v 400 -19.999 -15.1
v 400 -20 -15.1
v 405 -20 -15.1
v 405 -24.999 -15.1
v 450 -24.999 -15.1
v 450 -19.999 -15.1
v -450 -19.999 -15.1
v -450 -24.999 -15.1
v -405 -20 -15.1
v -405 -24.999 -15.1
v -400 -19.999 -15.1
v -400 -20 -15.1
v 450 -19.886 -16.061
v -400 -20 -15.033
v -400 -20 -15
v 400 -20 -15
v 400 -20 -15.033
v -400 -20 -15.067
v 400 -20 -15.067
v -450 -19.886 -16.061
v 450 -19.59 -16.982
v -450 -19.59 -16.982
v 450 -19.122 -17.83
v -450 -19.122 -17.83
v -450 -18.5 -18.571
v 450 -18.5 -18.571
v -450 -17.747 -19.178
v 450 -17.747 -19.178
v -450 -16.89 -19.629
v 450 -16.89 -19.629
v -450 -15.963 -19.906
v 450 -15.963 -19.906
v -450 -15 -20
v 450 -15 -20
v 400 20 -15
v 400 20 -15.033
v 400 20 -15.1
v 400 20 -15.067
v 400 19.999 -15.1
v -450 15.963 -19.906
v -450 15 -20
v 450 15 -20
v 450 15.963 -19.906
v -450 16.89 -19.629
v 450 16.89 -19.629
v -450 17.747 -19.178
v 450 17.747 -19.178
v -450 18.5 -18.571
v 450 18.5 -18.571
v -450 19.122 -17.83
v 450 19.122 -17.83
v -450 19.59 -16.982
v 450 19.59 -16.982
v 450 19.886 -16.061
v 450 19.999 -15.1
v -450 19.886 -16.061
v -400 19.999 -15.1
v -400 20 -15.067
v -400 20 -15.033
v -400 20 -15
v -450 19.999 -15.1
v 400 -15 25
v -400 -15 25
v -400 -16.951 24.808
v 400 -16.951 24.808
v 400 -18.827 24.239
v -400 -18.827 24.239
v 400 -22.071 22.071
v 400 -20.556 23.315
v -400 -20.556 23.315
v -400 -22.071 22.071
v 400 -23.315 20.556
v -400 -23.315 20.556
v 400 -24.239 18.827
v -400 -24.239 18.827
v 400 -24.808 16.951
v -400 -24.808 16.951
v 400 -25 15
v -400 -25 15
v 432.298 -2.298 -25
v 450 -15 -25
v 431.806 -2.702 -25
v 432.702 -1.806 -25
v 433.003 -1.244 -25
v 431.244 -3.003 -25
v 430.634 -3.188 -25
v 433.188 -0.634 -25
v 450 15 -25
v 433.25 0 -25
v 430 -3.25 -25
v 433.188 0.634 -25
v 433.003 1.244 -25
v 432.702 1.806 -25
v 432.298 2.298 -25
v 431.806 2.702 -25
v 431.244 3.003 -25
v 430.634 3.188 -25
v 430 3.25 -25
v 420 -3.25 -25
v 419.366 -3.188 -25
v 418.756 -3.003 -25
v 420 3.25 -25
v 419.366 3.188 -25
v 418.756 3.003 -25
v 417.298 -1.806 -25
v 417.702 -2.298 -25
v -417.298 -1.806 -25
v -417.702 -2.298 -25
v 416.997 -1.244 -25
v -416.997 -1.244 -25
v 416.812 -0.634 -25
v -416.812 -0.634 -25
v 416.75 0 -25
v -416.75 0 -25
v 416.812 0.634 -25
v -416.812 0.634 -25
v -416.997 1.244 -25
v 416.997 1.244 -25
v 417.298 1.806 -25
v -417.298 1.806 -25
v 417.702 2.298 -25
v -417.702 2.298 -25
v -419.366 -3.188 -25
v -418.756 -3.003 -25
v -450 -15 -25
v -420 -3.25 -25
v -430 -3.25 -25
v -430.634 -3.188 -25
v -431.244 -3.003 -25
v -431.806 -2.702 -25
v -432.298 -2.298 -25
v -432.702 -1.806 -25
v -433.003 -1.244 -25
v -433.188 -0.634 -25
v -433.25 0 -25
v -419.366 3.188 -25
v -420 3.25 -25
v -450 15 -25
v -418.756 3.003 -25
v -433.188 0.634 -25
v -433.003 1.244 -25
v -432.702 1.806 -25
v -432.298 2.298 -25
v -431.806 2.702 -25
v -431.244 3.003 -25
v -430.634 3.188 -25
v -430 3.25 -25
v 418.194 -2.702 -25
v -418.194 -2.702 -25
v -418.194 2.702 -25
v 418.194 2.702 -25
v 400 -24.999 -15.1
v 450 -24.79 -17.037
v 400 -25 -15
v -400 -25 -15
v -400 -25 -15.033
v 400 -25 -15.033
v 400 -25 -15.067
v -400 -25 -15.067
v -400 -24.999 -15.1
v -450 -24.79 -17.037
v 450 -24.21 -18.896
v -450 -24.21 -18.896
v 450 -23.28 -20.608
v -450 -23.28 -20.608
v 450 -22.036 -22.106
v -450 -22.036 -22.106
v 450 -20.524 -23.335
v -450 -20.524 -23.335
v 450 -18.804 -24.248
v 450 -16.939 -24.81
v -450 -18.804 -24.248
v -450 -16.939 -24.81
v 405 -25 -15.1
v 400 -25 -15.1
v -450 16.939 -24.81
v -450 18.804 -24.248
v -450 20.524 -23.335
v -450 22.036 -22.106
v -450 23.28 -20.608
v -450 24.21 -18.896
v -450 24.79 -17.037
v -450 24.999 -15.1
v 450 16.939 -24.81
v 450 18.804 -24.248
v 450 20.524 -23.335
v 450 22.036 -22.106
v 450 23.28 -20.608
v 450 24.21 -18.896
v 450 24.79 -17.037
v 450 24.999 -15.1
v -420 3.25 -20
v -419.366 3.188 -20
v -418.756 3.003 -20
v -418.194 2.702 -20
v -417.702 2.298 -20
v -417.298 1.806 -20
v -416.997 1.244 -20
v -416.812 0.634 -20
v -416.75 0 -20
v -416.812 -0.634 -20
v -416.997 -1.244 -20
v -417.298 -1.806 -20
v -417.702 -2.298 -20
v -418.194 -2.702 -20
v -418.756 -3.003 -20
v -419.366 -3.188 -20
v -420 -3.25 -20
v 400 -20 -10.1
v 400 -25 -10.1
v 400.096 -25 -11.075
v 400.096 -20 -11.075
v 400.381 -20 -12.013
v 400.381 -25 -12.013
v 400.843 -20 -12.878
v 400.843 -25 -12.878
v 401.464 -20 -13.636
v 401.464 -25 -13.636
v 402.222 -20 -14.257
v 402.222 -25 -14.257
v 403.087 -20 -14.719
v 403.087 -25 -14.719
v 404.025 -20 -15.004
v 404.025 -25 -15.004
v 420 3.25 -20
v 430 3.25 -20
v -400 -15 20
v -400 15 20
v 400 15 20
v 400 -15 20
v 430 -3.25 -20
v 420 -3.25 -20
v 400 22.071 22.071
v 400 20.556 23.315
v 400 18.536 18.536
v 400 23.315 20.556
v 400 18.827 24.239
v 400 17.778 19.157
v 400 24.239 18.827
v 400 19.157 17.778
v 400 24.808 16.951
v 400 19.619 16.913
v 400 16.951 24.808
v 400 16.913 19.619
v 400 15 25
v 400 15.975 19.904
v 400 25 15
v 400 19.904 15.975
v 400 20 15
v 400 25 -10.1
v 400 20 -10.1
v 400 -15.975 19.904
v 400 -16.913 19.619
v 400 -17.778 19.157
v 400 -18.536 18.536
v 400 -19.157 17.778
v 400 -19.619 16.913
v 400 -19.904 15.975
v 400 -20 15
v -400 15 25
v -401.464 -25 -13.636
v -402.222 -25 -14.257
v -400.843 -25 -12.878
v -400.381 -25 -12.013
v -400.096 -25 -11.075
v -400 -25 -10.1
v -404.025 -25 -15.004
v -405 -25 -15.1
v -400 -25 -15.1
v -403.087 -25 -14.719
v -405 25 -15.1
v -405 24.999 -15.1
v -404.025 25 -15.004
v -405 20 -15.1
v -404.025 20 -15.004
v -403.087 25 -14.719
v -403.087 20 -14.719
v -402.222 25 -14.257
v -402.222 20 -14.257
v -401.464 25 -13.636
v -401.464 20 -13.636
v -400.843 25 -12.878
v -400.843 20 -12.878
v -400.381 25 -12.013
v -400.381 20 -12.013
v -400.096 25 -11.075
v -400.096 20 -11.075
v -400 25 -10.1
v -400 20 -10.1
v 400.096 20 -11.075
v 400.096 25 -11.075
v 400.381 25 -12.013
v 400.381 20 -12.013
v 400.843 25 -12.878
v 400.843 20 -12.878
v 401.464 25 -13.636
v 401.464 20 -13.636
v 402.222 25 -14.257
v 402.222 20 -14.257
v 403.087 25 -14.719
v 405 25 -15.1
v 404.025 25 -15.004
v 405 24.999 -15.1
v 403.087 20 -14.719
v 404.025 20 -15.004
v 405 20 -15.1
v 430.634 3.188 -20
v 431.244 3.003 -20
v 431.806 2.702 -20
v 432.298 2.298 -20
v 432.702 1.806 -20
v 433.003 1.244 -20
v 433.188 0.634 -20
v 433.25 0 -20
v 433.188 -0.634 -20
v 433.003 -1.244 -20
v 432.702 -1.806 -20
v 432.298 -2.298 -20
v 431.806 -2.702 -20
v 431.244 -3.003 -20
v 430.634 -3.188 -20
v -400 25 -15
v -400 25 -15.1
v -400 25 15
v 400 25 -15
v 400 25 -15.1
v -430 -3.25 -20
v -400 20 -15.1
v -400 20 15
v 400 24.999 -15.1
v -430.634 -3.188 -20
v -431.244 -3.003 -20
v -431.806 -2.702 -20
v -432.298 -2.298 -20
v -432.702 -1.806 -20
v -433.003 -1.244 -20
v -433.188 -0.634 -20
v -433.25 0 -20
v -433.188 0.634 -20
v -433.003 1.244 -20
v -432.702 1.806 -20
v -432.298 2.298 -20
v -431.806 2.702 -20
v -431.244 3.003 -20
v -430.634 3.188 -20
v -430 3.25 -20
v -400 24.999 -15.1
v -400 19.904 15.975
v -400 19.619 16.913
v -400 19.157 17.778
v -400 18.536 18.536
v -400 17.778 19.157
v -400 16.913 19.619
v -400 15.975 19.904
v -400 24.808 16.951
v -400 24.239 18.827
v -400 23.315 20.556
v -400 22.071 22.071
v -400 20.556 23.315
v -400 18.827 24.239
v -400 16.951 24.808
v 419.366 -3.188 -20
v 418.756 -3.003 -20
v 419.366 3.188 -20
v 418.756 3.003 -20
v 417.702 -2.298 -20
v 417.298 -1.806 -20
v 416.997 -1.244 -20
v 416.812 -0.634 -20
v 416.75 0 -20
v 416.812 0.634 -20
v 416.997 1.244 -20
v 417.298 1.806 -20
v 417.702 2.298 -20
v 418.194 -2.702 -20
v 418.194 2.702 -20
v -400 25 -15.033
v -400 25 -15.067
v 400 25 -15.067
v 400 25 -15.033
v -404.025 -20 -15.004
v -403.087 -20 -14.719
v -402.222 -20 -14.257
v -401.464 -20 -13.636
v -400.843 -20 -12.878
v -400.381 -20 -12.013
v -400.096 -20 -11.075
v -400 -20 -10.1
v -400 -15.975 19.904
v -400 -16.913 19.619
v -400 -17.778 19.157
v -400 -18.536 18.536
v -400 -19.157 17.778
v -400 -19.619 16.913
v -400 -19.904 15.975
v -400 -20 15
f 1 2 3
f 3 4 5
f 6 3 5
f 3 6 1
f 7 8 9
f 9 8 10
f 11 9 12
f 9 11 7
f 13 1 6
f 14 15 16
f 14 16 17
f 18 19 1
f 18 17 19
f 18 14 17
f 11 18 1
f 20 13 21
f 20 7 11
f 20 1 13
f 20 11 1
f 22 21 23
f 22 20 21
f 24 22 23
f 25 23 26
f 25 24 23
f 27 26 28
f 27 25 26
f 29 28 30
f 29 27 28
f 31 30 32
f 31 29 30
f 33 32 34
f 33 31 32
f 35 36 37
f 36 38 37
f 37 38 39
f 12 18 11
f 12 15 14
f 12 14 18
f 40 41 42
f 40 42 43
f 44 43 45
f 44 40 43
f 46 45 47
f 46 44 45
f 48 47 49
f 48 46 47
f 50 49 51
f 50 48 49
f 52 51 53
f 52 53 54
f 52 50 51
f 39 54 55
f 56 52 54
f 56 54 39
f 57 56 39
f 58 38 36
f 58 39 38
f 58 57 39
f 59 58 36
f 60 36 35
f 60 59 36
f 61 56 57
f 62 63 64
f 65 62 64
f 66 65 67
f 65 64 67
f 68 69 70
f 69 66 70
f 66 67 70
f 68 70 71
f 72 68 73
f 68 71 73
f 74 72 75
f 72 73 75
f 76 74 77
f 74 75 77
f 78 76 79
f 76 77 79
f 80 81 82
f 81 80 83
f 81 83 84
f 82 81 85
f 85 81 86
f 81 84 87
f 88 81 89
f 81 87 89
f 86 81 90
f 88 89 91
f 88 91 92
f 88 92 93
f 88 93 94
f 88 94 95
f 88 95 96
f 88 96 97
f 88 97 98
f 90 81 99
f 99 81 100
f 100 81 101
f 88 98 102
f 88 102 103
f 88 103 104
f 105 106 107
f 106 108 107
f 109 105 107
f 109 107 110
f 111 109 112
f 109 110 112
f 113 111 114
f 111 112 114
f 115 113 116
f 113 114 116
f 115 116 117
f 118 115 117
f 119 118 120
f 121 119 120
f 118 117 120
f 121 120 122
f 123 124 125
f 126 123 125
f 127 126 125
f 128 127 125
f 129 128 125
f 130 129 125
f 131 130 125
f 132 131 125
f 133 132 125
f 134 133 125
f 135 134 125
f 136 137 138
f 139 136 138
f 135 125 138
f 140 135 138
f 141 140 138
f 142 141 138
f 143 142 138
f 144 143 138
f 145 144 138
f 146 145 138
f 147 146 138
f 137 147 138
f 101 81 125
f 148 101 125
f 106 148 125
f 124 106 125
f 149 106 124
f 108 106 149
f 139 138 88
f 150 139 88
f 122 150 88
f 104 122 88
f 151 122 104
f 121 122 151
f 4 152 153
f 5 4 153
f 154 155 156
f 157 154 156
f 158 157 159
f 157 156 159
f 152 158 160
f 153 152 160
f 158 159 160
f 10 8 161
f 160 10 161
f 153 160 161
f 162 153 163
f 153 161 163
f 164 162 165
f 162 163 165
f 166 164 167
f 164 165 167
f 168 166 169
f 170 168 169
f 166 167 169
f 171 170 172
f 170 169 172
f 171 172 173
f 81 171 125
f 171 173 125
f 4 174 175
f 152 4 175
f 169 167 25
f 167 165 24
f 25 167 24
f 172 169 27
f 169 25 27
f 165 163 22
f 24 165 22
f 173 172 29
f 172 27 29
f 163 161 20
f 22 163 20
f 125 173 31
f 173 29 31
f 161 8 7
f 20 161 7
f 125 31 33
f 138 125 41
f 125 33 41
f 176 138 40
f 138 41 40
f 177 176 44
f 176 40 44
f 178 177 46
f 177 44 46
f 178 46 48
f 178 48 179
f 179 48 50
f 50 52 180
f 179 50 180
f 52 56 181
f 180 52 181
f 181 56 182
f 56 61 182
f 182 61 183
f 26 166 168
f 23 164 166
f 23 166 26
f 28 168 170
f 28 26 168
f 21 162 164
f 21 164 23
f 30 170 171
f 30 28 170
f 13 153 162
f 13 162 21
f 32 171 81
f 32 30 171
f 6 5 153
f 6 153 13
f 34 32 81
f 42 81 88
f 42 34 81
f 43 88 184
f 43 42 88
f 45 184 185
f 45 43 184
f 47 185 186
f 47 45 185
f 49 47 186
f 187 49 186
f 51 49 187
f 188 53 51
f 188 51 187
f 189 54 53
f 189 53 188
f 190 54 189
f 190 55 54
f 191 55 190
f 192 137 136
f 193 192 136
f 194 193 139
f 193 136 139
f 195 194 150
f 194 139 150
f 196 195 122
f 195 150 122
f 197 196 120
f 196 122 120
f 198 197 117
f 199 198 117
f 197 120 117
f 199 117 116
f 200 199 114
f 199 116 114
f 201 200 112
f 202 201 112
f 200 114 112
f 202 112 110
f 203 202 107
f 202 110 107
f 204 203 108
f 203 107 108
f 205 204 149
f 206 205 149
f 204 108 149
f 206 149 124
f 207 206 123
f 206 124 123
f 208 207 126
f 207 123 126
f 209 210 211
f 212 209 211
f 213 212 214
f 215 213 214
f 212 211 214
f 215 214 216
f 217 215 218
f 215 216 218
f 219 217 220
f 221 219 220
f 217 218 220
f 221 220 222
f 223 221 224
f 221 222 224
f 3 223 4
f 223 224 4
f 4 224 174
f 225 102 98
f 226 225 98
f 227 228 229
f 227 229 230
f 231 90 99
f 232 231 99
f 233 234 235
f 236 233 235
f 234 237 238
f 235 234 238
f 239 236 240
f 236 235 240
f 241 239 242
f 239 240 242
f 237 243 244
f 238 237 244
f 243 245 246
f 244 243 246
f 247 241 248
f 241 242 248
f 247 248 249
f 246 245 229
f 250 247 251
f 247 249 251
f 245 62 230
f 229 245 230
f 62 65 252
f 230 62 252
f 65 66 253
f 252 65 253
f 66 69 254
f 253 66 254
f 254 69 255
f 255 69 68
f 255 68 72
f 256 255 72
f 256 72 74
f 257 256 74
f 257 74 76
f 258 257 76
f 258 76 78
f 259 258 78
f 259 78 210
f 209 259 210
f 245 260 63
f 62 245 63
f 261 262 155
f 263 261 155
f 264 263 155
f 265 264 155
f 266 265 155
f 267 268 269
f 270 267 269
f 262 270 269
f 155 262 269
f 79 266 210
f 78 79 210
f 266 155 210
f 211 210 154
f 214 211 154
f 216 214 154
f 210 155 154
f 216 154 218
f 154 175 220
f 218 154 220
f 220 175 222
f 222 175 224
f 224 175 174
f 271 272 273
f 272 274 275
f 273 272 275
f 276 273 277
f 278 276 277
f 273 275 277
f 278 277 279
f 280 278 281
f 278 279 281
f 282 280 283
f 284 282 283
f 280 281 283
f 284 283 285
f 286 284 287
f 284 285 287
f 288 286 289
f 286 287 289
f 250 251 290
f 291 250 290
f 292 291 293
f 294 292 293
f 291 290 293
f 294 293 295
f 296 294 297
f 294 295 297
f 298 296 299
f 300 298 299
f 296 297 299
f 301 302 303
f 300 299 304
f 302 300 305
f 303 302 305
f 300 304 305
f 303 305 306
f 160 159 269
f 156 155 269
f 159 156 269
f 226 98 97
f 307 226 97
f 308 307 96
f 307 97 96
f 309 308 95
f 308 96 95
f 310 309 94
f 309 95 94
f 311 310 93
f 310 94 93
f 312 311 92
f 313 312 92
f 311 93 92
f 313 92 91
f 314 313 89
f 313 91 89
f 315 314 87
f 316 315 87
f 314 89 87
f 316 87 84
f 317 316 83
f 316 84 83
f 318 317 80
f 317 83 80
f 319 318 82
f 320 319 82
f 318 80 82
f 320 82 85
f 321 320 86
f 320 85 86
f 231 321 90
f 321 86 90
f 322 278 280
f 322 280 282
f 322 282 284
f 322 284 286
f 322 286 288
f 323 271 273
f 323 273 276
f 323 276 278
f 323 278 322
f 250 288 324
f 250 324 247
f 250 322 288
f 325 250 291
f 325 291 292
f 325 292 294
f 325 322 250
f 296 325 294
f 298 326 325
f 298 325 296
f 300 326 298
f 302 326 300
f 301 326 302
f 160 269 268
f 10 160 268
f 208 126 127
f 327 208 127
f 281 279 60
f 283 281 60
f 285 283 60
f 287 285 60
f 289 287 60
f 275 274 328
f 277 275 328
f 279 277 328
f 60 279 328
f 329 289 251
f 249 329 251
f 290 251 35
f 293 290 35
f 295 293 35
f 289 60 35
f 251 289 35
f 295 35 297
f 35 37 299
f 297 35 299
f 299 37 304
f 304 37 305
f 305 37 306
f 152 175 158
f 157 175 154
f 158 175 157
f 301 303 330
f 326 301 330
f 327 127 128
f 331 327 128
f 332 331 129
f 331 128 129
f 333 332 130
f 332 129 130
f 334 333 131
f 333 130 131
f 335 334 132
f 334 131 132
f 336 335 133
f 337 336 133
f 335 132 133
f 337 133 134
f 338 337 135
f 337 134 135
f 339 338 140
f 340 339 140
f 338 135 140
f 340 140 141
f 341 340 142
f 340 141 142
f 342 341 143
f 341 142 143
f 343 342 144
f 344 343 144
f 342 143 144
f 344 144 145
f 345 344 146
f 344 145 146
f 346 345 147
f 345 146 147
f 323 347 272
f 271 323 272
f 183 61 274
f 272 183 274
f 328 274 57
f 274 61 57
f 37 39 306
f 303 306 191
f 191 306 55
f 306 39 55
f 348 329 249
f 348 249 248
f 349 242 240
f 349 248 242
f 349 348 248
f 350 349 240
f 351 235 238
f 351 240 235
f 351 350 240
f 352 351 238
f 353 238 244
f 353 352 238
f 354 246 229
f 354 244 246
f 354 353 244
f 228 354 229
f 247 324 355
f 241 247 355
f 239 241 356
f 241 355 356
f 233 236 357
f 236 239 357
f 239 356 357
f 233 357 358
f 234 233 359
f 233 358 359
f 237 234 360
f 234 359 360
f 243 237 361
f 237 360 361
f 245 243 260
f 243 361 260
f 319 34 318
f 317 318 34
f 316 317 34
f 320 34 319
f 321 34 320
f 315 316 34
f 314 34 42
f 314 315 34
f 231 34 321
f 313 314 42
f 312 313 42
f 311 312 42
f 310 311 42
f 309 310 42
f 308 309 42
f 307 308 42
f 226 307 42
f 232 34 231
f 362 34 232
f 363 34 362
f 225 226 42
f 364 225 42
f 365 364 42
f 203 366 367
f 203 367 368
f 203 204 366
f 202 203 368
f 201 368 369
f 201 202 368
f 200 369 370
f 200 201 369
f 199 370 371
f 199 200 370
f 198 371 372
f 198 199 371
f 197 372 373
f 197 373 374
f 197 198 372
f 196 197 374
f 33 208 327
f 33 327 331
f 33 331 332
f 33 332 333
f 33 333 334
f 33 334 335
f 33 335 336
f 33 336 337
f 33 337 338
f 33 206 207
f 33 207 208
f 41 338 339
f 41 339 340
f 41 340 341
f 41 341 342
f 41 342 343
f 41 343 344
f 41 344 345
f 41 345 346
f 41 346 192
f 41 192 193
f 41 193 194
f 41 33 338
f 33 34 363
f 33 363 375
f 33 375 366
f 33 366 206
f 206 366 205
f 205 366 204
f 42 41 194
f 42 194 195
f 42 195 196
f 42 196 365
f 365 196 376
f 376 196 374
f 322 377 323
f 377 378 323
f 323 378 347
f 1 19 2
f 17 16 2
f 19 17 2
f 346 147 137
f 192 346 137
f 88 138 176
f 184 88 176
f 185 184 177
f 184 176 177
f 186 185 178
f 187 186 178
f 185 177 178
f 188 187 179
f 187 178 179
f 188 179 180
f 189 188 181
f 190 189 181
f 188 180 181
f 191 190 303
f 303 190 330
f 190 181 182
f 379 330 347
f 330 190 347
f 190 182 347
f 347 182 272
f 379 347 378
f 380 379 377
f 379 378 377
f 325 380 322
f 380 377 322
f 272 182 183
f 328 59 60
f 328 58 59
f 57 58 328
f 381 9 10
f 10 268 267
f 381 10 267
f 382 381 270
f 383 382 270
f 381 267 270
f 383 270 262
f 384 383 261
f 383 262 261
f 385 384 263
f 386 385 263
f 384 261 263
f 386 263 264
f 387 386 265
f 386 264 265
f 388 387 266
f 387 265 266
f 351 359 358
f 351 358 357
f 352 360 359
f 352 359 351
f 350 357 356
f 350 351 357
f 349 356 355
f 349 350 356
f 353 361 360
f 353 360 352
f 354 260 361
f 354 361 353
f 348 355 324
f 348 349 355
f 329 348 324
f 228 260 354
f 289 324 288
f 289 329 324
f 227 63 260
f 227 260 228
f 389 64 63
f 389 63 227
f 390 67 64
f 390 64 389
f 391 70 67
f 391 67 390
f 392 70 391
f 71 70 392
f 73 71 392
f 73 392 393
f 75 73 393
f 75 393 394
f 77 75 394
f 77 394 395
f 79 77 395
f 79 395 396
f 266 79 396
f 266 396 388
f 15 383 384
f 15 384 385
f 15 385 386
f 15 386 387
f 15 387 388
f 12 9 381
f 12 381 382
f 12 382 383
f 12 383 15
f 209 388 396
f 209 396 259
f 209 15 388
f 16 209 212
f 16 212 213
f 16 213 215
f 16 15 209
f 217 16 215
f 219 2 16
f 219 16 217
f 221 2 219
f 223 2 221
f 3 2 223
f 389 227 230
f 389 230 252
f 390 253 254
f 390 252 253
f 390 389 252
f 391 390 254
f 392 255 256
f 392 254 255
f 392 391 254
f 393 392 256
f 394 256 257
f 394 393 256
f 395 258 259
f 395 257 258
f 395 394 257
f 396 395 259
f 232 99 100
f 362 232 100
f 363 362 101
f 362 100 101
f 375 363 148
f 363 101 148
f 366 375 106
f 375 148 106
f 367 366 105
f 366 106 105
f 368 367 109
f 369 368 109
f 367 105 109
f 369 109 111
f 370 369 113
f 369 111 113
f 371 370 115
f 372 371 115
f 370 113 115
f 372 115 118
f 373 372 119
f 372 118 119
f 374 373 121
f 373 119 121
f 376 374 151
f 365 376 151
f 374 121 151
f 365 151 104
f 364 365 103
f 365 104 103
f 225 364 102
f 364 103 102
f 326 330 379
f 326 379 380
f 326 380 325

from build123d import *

# Parameters (mm, degrees)
SHS_RHS50X50X5_1_DEPTH  = 900
CUT_EXTRUDE1_DEPTH      = 452.386752132
CUT_EXTRUDE1_DEPTH_BACK = 452.386752132
SKETCH20_W              = 50
SKETCH20_H              = 40.1
FILLET1_START           = -25
FILLET1_DEPTH           = 5
FILLET1_START_2         = 20
FILLET1_2_DEPTH         = 5
CUT_EXTRUDE2_DEPTH      = 10


with BuildPart() as part:
    # Sketch116 → Shs RHS50X50X5(1) (new body)
    with BuildSketch(Plane.YZ.offset(-450)):
        with BuildLine():
            Line((-15, -25), (15, -25))
            ThreePointArc((15, -25), (22.071067812, -22.071067812), (25, -15))
            Line((25, -15), (25, 15))
            ThreePointArc((25, 15), (22.071067812, 22.071067812), (15, 25))
            Line((15, 25), (-15, 25))
            ThreePointArc((-15, 25), (-22.071067812, 22.071067812), (-25, 15))
            Line((-25, 15), (-25, -15))
            ThreePointArc((-25, -15), (-22.071067812, -22.071067812), (-15, -25))
        make_face()
        with BuildLine():
            Line((-15, -20), (15, -20))
            ThreePointArc((15, -20), (18.535533906, -18.535533906), (20, -15))
            Line((20, -15), (20, 15))
            ThreePointArc((20, 15), (18.535533906, 18.535533906), (15, 20))
            Line((15, 20), (-15, 20))
            ThreePointArc((-15, 20), (-18.535533906, 18.535533906), (-20, 15))
            Line((-20, 15), (-20, -15))
            ThreePointArc((-20, -15), (-18.535533906, -18.535533906), (-15, -20))
        make_face(mode=Mode.SUBTRACT)
    extrude(amount=SHS_RHS50X50X5_1_DEPTH)

    # Sketch20 → Cut-Extrude1 (cut, two sides: drawn at the far end of the back side and taken through both)
    with BuildSketch(Plane(origin=(0, 0, 0), x_dir=(1, 0, 0), z_dir=(0, 1, 0)).offset(-CUT_EXTRUDE1_DEPTH_BACK)):
        with Locations((425, -4.95)):
            Rectangle(SKETCH20_W, SKETCH20_H)
        with Locations((-425, -4.95)):
            Rectangle(SKETCH20_W, SKETCH20_H)
    extrude(amount=CUT_EXTRUDE1_DEPTH + CUT_EXTRUDE1_DEPTH_BACK, mode=Mode.SUBTRACT)

    # Fillet1: read off the stored shape, not the designer's step
    # Fillet1 outline → Fillet1 (add)
    with BuildSketch(Plane(origin=(0, 0, 0), x_dir=(1, 0, 0), z_dir=(0, 1, 0)).offset(FILLET1_START)):
        with BuildLine():
            Line((400, 15.1), (400, 10.1))
            ThreePointArc((400, 10.1), (401.464466094, 13.635533906), (405, 15.1))
            Line((405, 15.1), (400, 15.1))
        make_face()
        with BuildLine():
            Line((-400, 15.1), (-405, 15.1))
            ThreePointArc((-405, 15.1), (-401.464466094, 13.635533906), (-400, 10.1))
            Line((-400, 10.1), (-400, 15.1))
        make_face()
    extrude(amount=FILLET1_DEPTH)

    # Fillet1 2 outline → Fillet1 2 (add)
    with BuildSketch(Plane(origin=(0, 0, 0), x_dir=(1, 0, 0), z_dir=(0, 1, 0)).offset(FILLET1_START_2)):
        with BuildLine():
            Line((400, 15.1), (400, 10.1))
            ThreePointArc((400, 10.1), (401.464466094, 13.635533906), (405, 15.1))
            Line((405, 15.1), (400, 15.1))
        make_face()
        with BuildLine():
            Line((-400, 15.1), (-405, 15.1))
            ThreePointArc((-405, 15.1), (-401.464466094, 13.635533906), (-400, 10.1))
            Line((-400, 10.1), (-400, 15.1))
        make_face()
    extrude(amount=FILLET1_2_DEPTH)

    # Sketch21 → Cut-Extrude2 (cut)
    with BuildSketch(Plane(origin=(0, 0, -25), x_dir=(-1, 0, 0), z_dir=(0, 0, 1))):
        with BuildLine():
            Line((420, 3.25), (430, 3.25))
            ThreePointArc((430, 3.25), (433.25, 0), (430, -3.25))
            Line((430, -3.25), (420, -3.25))
            ThreePointArc((420, -3.25), (416.75, 0), (420, 3.25))
        make_face()
        with BuildLine():
            Line((-430, 3.25), (-420, 3.25))
            ThreePointArc((-420, 3.25), (-416.75, 0), (-420, -3.25))
            Line((-420, -3.25), (-430, -3.25))
            ThreePointArc((-430, -3.25), (-433.25, 0), (-430, 3.25))
        make_face()
    extrude(amount=CUT_EXTRUDE2_DEPTH, mode=Mode.SUBTRACT)


solid = part.part
